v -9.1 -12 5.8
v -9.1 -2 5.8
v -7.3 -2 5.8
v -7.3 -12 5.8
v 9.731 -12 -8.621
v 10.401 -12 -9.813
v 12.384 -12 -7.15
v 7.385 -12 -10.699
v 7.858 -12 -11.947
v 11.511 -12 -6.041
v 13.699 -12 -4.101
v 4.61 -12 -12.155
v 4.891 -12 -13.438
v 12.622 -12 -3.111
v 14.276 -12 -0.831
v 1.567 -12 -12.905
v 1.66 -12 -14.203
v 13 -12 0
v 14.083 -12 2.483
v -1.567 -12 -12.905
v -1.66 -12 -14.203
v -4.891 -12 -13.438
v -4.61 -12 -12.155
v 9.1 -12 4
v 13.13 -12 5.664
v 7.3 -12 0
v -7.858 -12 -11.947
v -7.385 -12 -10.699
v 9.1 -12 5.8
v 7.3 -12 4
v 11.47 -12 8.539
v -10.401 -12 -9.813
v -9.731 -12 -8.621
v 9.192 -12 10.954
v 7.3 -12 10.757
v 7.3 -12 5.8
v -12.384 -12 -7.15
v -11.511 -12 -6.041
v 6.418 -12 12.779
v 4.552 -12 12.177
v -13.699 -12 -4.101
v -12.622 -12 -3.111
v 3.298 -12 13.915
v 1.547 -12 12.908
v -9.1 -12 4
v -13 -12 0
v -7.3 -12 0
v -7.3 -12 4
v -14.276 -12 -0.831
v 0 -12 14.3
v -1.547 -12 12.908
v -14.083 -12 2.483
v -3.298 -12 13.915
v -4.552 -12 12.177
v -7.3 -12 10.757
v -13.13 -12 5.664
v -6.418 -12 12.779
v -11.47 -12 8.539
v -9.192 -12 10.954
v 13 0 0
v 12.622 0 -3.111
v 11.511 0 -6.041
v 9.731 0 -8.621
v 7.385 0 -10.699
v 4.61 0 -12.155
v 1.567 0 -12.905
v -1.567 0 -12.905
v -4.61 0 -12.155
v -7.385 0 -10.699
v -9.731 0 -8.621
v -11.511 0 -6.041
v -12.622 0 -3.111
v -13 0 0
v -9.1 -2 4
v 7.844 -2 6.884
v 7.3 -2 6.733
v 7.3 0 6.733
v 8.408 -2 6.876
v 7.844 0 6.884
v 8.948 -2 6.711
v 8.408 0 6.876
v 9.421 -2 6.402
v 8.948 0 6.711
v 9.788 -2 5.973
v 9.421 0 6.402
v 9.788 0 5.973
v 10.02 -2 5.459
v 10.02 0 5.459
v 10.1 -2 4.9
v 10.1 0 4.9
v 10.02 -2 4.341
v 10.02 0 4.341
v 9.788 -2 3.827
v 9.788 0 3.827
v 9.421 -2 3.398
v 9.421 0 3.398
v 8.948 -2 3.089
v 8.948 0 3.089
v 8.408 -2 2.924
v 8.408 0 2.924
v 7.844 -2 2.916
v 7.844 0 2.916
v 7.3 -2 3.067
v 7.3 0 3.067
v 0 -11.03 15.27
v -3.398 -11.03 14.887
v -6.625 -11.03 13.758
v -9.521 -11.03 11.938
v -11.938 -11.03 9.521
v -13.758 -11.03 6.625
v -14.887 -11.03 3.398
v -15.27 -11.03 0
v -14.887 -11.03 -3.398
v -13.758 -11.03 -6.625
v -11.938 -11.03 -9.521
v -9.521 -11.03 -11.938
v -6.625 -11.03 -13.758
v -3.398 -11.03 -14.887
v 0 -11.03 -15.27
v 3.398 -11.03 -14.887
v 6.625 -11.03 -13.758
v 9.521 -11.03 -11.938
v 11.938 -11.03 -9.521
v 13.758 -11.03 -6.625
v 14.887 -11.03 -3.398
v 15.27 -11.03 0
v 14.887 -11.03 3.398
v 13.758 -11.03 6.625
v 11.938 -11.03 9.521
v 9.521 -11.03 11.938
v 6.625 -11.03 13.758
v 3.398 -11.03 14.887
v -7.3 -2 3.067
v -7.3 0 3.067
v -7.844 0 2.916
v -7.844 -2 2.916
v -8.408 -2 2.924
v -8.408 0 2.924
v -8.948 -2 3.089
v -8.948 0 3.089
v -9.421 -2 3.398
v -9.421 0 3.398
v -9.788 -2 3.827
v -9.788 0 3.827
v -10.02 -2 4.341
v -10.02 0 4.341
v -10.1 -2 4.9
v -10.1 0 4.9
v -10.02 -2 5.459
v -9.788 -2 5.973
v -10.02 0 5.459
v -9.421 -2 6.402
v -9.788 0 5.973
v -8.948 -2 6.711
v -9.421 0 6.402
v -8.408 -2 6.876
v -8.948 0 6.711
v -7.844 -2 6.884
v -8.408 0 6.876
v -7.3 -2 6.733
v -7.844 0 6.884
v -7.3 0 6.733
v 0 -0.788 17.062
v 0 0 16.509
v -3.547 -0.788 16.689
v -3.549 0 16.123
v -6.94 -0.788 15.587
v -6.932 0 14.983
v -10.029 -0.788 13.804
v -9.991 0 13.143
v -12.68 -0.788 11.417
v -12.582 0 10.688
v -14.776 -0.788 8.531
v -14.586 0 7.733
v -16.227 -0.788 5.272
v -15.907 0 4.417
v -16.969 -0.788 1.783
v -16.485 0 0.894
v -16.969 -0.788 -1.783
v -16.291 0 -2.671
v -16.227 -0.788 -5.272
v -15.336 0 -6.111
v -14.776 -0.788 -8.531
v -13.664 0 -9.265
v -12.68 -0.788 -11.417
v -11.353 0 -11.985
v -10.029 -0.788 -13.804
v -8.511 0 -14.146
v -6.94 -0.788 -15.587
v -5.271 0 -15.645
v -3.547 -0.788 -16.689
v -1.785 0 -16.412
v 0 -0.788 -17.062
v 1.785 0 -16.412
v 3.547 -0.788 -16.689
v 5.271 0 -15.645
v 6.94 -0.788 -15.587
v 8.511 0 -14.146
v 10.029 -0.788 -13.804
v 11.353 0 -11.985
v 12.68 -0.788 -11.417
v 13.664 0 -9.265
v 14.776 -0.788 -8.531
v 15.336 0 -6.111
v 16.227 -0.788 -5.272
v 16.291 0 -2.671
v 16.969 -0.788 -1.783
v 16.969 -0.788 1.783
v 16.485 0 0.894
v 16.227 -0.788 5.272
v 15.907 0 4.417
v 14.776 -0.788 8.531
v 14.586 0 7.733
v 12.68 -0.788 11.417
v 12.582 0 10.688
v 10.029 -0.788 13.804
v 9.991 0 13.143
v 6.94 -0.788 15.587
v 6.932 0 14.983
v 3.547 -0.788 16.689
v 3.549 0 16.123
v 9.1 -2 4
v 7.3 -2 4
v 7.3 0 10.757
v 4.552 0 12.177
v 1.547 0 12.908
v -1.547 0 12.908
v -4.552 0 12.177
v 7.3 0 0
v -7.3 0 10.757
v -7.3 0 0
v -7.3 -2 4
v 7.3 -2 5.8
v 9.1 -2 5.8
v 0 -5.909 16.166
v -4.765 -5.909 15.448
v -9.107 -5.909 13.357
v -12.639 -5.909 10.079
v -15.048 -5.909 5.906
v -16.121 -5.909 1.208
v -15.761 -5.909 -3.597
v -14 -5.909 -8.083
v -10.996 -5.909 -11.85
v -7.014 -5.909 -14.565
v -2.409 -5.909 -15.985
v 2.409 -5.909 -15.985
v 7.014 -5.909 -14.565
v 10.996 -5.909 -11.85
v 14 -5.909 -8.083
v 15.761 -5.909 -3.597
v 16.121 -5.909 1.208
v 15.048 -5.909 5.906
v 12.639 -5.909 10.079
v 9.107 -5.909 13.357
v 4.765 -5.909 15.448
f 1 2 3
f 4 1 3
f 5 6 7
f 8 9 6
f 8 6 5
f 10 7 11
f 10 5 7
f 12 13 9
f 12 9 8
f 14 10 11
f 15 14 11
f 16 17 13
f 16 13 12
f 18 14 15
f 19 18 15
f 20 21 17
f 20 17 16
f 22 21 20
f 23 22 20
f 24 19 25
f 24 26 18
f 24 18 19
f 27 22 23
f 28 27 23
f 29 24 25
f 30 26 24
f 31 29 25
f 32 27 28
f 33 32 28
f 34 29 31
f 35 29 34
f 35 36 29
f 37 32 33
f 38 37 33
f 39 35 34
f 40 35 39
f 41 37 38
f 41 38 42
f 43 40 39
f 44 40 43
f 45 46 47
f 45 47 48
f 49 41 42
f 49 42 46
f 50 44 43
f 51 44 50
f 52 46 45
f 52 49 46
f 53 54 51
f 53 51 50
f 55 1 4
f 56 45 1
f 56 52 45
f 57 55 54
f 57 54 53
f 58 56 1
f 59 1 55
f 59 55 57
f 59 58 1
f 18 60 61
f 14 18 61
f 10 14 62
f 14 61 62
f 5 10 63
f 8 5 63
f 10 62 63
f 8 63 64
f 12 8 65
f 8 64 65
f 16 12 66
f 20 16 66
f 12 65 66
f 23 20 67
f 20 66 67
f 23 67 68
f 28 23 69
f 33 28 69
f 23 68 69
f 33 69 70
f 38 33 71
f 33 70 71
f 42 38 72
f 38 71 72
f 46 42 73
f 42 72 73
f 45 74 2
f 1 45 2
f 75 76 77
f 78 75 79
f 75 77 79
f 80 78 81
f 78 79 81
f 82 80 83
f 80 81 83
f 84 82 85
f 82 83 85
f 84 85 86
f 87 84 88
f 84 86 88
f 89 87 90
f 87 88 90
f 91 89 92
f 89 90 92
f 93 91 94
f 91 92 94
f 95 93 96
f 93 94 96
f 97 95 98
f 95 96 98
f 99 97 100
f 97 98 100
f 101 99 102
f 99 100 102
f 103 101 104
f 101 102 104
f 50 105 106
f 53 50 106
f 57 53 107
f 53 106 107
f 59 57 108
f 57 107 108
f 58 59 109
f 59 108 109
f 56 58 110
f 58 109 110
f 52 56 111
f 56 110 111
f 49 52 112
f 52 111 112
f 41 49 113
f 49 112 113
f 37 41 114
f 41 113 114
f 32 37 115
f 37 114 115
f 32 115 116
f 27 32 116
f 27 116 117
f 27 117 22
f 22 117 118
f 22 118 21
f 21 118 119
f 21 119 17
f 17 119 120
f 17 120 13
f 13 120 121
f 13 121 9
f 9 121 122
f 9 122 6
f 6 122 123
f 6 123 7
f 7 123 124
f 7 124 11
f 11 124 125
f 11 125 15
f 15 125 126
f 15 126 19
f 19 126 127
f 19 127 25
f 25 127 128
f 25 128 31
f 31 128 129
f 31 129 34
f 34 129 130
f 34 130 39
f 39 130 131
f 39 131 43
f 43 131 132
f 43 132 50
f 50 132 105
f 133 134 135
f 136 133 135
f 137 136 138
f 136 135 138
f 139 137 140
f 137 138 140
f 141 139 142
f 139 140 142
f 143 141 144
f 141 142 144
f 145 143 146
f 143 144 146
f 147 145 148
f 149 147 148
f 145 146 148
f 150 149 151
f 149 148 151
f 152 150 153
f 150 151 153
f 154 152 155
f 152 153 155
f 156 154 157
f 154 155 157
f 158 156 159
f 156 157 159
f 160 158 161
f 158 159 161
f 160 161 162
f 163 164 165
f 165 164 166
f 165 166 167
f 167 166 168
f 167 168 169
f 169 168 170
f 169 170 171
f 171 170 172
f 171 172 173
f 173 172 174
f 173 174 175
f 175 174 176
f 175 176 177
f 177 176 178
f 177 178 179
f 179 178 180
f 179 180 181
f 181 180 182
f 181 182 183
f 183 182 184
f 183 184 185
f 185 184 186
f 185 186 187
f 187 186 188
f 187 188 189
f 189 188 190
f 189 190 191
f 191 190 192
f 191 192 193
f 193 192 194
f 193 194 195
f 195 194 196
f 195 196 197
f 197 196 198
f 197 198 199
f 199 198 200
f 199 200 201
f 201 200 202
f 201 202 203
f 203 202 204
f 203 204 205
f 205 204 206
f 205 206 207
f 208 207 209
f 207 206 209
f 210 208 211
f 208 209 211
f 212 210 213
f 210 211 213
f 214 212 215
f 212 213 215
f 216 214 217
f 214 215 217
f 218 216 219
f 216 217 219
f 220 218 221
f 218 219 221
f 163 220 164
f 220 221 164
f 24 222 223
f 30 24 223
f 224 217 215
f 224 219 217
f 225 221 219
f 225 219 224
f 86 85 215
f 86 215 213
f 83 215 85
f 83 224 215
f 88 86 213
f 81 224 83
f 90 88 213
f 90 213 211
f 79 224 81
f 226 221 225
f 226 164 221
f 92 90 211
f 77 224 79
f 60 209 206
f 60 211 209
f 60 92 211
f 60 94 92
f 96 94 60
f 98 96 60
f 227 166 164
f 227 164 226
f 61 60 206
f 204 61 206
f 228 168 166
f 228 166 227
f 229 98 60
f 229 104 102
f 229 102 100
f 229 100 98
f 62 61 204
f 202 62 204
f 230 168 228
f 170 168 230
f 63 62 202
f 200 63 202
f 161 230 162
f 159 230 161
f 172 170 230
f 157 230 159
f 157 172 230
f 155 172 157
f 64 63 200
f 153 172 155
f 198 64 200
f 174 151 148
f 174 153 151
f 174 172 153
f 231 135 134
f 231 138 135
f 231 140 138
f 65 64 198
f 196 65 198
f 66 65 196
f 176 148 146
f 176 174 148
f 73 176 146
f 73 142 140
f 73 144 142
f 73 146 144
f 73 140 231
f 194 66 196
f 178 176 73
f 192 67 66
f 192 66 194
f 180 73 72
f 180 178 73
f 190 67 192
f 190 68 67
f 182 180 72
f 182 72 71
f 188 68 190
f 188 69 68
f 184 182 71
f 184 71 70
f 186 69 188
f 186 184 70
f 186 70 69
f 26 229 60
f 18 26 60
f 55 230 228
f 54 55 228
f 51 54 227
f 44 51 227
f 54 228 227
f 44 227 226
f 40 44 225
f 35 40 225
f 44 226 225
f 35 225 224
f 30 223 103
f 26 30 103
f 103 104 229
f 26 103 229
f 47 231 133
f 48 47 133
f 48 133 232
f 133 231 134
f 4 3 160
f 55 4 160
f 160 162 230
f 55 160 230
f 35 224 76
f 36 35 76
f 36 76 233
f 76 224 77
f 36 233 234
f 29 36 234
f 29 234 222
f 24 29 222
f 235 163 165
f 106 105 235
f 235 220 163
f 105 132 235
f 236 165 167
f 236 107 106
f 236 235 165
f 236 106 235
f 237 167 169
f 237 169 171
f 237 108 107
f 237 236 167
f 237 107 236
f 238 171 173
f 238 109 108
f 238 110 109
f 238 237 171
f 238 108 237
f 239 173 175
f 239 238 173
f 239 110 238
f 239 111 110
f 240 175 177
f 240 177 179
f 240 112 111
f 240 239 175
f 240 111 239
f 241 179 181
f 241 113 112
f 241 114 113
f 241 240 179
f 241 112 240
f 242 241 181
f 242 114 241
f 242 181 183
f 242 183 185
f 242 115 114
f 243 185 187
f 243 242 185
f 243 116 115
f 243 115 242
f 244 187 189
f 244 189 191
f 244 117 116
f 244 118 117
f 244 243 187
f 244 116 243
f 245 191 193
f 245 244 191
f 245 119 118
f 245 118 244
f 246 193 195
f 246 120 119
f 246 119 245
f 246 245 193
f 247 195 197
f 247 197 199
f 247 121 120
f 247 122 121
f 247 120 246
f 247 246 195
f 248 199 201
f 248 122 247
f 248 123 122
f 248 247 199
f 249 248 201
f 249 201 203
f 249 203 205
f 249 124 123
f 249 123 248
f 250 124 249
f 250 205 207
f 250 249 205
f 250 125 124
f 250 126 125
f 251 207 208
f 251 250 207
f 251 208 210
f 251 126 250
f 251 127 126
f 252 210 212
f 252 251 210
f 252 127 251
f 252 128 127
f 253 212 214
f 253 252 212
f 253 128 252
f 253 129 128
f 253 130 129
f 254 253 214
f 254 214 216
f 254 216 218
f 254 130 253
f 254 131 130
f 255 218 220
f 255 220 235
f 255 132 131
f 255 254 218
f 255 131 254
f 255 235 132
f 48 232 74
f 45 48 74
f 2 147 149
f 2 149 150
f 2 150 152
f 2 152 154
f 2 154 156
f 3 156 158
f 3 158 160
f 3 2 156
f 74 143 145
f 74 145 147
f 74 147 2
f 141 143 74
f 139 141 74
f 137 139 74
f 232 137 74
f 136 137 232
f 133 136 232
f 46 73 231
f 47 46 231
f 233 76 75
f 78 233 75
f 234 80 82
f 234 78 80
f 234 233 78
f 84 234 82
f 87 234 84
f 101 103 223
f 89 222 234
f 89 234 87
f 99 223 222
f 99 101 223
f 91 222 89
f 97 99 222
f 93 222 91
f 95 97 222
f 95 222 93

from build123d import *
from OCP.BRepFilletAPI import BRepFilletAPI_MakeChamfer

# Parameters (mm, degrees)
CUT_EXTRUDE1_DEPTH = 28.123421613
SKETCH3_R          = 2
CUT_EXTRUDE2_DEPTH = 2
CHAMFER1_SIZE      = 0.8
CHAMFER1_SIZE2     = 0.984433479
CHAMFER1_SIZE2_2   = 0.691197975


with BuildPart() as part:
    # Sketch1 → Revolve1 (revolve)
    with BuildSketch(Plane.XY, mode=Mode.PRIVATE) as revolve1_sk:
        Polygon((0, 0), (-17.2, 0), (-15.1, -12), (0, -12), align=None)
    revolve(revolve1_sk.sketch.rotate(Axis((0, 0, 0), (0, -1, 0)), 270), axis=Axis((0, 0, 0), (0, -1, 0)))

    # Sketch2 → Cut-Extrude1 (cut, through all)
    with BuildSketch(Plane(origin=(0, 0, 0), x_dir=(1, 0, 0), z_dir=(0, 1, 0))):
        with BuildLine():
            Line((-9.1, -5.8), (-7.3, -5.8))
            Line((-7.3, -5.8), (-7.3, -10.756858277))
            ThreePointArc((-7.3, -10.756858277), (0, -13), (7.3, -10.756858277))
            Line((7.3, -10.756858277), (7.3, -5.8))
            Line((7.3, -5.8), (9.1, -5.8))
            Line((9.1, -5.8), (9.1, -4))
            Line((9.1, -4), (7.3, -4))
            Line((7.3, -4), (7.3, 0))
            Line((7.3, 0), (13, 0))
            ThreePointArc((13, 0), (0, 13), (-13, 0))
            Line((-13, 0), (-7.3, 0))
            Line((-7.3, 0), (-7.3, -4))
            Line((-7.3, -4), (-9.1, -4))
            Line((-9.1, -4), (-9.1, -5.8))
        make_face()
    extrude(amount=-CUT_EXTRUDE1_DEPTH, mode=Mode.SUBTRACT)

    # Sketch3 → Cut-Extrude2 (cut)
    with BuildSketch(Plane(origin=(0, 0, 0), x_dir=(1, 0, 0), z_dir=(0, 1, 0))):
        with Locations((-8.1, -4.9)):
            Circle(SKETCH3_R)
        with Locations((8.1, -4.9)):
            Circle(SKETCH3_R)
    extrude(amount=-CUT_EXTRUDE2_DEPTH, mode=Mode.SUBTRACT)

    # Chamfer1: one chamfer whose edges measure the first distance from different faces: ONE call of the kernel's chamfer builder (chamfer() names one face for all edges)
    chamfer1_edges_1 = [part.edges().sort_by_distance(p)[0] for p in [
        (0, -12, -15.1),
    ]]
    chamfer1_side_1 = [part.faces().sort_by_distance(p)[0] for p in [
        (0, -12, -14.672907504),
    ]]
    chamfer1_edges_2 = [part.edges().sort_by_distance(p)[0] for p in [
        (0, 0, -17.2),
    ]]
    chamfer1_side_2 = [part.faces().sort_by_distance(p)[0] for p in [
        (0, -6, -16.15),
    ]]
    chamfer1 = BRepFilletAPI_MakeChamfer(part.part.solid().wrapped)
    for e in chamfer1_edges_1:
        chamfer1.Add(CHAMFER1_SIZE, CHAMFER1_SIZE2, e.wrapped, chamfer1_side_1[0].wrapped)  # the first distance lies on this face
    for e in chamfer1_edges_2:
        chamfer1.Add(CHAMFER1_SIZE, CHAMFER1_SIZE2_2, e.wrapped, chamfer1_side_2[0].wrapped)  # the first distance lies on this face
    add(Compound.cast(chamfer1.Shape()), mode=Mode.REPLACE)


solid = part.part
